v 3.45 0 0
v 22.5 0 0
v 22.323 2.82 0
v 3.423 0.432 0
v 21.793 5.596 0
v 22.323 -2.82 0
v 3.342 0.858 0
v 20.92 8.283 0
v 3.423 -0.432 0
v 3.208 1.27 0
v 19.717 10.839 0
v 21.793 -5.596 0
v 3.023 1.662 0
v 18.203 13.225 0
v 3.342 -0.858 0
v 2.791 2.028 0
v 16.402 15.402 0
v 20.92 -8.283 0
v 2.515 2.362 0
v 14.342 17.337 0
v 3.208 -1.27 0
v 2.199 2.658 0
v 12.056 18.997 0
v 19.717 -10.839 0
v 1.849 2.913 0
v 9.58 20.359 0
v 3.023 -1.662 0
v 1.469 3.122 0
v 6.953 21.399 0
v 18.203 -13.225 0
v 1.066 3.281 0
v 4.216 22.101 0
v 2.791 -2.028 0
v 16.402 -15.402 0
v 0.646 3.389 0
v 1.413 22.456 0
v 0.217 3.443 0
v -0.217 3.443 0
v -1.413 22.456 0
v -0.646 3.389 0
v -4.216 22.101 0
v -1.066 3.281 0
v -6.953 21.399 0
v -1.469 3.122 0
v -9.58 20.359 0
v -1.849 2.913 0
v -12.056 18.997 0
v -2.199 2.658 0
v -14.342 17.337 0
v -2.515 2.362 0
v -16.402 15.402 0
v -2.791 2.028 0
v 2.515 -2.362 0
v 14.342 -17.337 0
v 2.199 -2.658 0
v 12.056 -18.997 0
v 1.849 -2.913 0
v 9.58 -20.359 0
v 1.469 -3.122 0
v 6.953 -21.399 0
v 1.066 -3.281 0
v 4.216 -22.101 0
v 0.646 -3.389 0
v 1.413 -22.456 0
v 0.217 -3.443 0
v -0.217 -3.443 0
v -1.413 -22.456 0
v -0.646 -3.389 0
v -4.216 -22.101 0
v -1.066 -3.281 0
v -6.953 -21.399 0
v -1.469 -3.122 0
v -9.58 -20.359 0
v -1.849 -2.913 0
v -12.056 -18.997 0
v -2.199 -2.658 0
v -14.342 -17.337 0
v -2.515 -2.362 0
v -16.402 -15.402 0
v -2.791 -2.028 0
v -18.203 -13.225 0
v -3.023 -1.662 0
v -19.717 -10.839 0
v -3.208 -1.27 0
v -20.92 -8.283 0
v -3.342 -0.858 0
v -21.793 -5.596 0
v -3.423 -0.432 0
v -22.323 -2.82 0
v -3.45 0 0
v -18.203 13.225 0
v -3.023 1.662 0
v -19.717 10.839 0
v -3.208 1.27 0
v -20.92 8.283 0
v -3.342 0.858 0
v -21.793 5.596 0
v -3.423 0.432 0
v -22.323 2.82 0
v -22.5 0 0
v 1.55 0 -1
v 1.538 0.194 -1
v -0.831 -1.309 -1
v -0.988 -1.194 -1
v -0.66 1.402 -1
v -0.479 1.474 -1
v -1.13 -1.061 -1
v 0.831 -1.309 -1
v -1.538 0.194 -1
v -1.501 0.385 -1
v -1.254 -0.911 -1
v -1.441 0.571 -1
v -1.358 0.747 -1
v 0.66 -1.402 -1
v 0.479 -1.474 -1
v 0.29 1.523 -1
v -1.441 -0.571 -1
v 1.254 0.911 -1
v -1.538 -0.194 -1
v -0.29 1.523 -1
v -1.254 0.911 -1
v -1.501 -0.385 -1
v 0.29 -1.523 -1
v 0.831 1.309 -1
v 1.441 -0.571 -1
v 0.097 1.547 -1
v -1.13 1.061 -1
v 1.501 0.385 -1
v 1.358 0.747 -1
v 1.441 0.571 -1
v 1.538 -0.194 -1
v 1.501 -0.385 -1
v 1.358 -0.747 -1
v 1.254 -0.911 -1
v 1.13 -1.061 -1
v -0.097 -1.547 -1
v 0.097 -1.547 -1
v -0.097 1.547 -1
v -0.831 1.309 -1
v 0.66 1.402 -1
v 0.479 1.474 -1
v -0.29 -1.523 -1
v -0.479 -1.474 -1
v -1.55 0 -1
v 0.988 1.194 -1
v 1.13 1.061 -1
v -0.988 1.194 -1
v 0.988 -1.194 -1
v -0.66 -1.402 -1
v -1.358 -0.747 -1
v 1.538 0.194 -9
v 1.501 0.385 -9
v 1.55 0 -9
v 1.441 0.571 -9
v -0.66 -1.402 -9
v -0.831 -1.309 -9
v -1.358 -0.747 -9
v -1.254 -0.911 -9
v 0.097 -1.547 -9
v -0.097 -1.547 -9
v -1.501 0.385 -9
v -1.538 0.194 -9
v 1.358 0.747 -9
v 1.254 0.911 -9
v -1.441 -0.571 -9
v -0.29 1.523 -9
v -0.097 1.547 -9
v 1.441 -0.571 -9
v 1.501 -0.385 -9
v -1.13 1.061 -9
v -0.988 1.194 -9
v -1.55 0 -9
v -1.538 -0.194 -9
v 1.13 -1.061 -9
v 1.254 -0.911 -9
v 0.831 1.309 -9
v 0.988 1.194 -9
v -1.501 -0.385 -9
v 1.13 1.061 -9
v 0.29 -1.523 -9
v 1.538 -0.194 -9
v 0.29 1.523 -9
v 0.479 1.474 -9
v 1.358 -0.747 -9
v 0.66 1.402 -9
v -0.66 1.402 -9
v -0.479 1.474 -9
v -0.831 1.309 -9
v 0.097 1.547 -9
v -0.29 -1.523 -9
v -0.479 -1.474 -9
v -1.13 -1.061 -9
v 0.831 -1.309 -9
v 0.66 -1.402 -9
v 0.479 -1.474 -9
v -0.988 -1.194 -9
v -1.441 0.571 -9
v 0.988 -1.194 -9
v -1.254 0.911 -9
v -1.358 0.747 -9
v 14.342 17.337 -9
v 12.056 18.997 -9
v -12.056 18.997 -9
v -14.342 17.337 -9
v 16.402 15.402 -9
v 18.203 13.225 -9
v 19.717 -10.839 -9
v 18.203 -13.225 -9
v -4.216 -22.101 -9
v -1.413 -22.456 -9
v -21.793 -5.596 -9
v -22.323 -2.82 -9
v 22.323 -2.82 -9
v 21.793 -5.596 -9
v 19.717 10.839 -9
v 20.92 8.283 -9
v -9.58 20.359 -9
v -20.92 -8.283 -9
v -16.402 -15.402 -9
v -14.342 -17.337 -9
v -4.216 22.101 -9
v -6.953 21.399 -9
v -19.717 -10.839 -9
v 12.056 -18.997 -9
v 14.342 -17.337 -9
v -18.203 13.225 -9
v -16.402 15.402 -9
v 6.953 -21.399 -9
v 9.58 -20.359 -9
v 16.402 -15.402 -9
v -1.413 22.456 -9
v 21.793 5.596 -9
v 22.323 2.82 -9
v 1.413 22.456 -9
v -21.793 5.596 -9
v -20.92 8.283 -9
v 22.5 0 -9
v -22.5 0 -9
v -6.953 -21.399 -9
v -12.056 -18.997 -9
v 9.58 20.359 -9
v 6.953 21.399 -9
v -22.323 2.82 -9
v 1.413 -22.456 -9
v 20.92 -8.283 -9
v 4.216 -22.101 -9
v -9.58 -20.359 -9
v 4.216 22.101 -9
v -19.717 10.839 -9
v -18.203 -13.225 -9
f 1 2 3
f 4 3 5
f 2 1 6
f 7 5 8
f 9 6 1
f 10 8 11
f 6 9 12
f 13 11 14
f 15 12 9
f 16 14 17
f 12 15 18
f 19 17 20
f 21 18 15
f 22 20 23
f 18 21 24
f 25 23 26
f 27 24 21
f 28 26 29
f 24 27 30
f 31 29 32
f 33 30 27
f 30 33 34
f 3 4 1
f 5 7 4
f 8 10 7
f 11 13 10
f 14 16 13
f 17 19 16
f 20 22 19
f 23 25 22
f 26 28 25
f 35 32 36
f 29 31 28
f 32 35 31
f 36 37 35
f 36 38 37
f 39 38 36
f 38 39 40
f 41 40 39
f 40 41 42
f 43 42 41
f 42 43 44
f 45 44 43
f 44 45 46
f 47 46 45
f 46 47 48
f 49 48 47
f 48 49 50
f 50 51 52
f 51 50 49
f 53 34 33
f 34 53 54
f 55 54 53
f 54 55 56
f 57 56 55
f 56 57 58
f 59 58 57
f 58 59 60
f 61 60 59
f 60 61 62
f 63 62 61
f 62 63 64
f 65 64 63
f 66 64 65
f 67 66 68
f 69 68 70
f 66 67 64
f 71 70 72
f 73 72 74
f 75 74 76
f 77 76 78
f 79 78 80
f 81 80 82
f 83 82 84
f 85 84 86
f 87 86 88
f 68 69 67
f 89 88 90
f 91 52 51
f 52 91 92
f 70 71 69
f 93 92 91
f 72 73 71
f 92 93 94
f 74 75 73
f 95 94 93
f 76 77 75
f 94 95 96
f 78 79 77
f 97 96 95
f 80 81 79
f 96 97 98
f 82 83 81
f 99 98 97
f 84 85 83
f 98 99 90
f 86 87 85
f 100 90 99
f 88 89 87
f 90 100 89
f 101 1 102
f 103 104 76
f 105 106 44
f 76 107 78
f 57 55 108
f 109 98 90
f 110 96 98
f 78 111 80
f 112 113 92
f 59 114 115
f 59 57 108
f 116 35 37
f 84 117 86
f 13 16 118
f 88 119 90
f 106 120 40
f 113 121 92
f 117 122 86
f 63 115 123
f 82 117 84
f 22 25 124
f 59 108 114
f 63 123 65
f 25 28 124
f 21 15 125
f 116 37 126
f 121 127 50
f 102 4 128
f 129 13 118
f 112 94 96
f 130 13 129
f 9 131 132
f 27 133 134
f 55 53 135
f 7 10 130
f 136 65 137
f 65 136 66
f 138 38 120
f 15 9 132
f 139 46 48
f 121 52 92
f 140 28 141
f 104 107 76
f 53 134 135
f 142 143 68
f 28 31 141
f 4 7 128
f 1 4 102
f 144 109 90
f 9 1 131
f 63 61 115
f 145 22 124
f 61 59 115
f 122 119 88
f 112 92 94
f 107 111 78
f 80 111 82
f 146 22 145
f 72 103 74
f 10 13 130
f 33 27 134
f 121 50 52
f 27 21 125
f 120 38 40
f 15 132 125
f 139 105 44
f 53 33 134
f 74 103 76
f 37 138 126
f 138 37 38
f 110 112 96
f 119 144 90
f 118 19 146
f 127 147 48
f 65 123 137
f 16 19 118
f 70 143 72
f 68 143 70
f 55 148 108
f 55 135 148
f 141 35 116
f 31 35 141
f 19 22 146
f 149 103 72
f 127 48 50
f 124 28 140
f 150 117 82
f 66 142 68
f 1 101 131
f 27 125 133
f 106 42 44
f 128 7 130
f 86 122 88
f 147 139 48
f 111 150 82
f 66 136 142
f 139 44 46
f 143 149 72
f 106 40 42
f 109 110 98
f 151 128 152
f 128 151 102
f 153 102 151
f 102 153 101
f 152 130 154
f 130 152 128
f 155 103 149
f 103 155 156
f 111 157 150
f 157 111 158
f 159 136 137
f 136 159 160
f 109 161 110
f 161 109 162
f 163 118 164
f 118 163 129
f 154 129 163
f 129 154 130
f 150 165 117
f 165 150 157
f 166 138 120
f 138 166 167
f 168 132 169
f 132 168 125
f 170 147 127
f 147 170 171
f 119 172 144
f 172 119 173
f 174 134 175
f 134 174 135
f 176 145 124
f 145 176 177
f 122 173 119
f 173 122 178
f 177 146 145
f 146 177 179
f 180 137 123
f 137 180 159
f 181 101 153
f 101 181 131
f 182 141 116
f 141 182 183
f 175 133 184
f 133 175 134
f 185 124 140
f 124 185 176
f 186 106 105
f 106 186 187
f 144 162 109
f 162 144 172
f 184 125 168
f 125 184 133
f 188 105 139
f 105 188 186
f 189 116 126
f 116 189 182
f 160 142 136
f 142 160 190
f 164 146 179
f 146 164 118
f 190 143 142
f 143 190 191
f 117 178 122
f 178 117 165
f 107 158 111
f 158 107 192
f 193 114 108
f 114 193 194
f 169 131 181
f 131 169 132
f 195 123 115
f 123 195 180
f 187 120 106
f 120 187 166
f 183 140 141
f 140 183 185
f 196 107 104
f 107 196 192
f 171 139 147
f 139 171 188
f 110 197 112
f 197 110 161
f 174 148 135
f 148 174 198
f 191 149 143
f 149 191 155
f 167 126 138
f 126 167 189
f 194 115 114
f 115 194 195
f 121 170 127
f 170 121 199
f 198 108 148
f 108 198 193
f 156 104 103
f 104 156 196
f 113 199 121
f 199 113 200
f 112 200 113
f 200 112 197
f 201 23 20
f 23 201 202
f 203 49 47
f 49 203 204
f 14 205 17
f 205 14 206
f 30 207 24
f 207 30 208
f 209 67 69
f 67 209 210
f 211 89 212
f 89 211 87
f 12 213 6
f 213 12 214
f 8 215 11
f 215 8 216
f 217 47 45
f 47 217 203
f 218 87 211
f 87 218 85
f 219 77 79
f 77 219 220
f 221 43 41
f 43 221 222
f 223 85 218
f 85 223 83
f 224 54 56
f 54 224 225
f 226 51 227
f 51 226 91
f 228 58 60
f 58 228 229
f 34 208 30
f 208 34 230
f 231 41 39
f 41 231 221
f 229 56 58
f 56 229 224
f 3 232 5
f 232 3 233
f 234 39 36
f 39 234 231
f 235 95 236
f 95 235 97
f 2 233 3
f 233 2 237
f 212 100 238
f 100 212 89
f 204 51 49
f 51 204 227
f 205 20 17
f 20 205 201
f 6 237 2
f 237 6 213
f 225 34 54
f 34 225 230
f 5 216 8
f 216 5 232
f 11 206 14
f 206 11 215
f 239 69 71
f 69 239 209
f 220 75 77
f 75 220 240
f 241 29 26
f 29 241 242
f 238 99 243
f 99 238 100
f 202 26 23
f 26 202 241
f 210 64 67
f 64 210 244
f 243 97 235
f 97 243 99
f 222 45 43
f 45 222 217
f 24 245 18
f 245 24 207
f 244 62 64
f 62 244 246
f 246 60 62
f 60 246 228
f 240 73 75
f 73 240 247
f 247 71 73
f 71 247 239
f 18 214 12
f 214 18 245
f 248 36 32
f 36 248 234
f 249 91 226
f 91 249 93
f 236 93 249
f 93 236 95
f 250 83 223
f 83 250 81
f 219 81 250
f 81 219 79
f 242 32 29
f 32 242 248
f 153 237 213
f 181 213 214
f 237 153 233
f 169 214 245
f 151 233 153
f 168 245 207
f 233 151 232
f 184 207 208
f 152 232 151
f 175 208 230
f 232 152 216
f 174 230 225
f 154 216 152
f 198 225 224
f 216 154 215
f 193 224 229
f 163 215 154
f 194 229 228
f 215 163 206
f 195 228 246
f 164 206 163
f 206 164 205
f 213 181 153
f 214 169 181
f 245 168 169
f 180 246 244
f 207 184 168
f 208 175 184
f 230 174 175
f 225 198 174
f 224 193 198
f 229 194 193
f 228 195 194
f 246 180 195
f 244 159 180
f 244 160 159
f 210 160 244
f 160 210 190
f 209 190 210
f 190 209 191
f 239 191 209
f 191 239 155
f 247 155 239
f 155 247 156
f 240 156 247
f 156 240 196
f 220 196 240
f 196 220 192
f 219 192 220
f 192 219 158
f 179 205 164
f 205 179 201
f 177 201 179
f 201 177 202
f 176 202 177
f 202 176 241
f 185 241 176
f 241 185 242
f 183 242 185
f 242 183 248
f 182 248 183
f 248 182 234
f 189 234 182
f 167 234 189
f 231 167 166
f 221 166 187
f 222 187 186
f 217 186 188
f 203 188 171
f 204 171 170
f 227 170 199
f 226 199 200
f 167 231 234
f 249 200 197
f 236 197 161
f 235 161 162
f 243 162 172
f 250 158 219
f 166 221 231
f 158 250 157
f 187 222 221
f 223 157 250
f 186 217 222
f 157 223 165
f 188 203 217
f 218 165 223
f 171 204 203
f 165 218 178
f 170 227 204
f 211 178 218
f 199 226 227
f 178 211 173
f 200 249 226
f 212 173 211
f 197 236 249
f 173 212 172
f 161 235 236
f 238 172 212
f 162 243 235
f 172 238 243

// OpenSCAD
$fn = 50;

difference() {
	union() {
		translate(v = [0, 0, -9.0]) {
			cylinder(h = 9, r = 22.5);
		}
	}
	union() {
		translate(v = [0, 0, 0]) {
			rotate(a = [0, 0, 0]) {
				difference() {
					union() {
						translate(v = [0, 0, -12.0]) {
							cylinder(h = 12, r = 1.25);
						}
						translate(v = [0, 0, -1.0]) {
							cylinder(h = 1.0, r1 = 1.55, r2 = 3.45);
						}
						translate(v = [0, 0, -12.0]) {
							cylinder(h = 12, r = 1.55);
						}
						translate(v = [0, 0, -12.0]) {
							cylinder(h = 12, r = 1.25);
						}
					}
					union();
				}
			}
		}
	}
}
